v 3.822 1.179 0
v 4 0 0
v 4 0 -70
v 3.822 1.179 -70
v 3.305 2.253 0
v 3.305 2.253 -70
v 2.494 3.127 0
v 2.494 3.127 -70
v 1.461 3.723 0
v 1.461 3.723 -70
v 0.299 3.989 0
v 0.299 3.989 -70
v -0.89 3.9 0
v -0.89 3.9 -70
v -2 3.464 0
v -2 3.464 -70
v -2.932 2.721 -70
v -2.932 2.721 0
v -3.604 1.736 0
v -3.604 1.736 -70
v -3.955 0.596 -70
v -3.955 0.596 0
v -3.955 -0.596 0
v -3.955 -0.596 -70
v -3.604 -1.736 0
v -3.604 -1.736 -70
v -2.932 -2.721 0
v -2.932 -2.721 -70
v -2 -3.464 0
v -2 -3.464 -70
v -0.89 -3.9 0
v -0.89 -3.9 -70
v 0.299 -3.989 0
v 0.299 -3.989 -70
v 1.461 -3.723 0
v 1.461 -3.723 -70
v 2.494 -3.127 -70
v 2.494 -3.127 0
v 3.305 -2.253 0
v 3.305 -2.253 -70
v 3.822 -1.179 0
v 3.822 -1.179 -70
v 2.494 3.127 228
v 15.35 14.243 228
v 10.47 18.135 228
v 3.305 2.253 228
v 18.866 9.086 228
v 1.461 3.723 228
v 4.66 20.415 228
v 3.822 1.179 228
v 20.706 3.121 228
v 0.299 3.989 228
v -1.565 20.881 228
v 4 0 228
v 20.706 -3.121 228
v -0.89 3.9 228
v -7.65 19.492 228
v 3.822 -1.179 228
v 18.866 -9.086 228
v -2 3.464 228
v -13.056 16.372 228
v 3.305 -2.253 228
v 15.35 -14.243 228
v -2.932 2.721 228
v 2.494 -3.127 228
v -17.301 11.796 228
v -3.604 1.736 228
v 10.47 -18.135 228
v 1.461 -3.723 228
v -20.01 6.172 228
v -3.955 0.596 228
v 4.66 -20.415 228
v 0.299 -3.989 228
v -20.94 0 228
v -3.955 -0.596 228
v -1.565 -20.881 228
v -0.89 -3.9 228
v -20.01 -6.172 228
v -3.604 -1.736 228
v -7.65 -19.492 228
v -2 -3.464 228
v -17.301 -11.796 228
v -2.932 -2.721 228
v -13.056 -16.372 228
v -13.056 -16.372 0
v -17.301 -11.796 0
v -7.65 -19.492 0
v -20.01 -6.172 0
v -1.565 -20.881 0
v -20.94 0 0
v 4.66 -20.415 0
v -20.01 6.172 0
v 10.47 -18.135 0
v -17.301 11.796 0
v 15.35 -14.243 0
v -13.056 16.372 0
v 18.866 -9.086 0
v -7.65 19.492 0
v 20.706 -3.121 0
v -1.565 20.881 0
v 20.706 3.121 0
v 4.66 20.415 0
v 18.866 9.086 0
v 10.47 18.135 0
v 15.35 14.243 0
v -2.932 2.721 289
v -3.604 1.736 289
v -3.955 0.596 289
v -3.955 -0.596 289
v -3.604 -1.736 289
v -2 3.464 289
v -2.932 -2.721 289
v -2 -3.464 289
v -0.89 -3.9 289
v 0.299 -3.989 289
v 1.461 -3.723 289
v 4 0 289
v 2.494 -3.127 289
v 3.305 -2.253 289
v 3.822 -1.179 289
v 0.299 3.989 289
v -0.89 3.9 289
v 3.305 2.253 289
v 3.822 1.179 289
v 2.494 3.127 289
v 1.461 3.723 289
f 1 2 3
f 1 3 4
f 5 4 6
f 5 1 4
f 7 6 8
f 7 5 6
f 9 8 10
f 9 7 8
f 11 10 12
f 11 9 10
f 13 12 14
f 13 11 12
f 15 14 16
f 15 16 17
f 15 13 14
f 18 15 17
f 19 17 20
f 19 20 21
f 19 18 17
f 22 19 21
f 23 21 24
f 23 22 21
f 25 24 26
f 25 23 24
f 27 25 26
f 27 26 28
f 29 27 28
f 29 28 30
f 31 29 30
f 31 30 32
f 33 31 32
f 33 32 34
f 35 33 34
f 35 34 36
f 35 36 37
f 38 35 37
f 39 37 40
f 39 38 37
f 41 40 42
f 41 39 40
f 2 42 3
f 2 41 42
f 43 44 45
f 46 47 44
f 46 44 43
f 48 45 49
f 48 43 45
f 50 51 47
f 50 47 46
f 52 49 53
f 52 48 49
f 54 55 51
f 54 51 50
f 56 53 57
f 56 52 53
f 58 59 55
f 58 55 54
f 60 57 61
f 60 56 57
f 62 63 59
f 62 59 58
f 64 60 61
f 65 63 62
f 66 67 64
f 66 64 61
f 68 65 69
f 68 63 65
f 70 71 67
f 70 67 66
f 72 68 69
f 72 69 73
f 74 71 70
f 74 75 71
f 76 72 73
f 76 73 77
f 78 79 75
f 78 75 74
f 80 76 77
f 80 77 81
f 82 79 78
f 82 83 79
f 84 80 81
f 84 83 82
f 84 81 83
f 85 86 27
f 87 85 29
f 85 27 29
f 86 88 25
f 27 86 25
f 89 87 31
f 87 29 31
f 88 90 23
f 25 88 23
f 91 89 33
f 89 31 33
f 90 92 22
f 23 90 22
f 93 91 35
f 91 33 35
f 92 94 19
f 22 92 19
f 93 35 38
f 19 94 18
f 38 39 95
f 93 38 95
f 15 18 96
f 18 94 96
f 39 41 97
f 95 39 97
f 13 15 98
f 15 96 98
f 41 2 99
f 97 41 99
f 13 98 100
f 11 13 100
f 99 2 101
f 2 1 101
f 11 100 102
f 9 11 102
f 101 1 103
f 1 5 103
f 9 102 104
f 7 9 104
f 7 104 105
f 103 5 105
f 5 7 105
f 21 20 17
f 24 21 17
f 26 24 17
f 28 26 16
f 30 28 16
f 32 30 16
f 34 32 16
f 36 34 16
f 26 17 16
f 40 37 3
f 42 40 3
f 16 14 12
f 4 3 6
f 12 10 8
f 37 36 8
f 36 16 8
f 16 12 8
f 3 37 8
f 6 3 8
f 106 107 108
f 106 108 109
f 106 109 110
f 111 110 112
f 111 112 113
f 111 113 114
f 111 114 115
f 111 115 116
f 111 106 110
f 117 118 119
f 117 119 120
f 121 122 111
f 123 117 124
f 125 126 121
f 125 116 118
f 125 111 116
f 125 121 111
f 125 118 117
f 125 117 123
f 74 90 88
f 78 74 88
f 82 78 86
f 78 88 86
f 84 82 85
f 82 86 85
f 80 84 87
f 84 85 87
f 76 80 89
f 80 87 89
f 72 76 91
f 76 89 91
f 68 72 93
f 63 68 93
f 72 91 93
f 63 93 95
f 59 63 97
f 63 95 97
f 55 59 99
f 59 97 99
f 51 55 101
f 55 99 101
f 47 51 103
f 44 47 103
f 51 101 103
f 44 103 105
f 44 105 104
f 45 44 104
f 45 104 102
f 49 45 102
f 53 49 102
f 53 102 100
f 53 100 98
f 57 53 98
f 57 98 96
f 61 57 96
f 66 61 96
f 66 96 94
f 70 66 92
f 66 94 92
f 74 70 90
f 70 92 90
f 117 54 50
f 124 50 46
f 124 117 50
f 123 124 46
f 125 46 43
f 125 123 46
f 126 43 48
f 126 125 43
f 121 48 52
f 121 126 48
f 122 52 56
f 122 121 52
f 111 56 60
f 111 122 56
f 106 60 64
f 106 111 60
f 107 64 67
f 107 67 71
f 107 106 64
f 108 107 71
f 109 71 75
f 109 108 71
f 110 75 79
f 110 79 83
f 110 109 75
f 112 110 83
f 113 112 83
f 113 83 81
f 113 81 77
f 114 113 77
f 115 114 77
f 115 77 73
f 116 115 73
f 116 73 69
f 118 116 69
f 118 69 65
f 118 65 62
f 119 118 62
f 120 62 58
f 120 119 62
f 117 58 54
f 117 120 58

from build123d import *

# Parameters (mm, degrees)
SKETCH1_R           = 20.94
SKETCH1_R_2         = 4
SKETCH1_R_3         = 3.95
BOSS_EXTRUDE1_DEPTH = 228
SKETCH1_3_R         = 4
BOSS_EXTRUDE2_DEPTH = 70
BOSS_EXTRUDE4_START = 289
SKETCH1_5_R         = 4
SKETCH1_5_R_2       = 3.95
BOSS_EXTRUDE4_DEPTH = 61


with BuildPart() as part:
    # Sketch1 → Boss-Extrude1 (new body)
    # profile 1 of 3: a face of its own
    with BuildSketch(Plane.XY):
        with Locations(Location((0, 0, 0), (0, 0, 180))):
            Circle(SKETCH1_R)
        Circle(SKETCH1_R_2, mode=Mode.SUBTRACT)
    # profile 2 of 3: a face of its own
    with BuildSketch(Plane.XY):
        Circle(SKETCH1_R_2)
        Circle(SKETCH1_R_3, mode=Mode.SUBTRACT)
    # profile 3 of 3: a face of its own
    with BuildSketch(Plane.XY):
        Circle(SKETCH1_R_3)
    extrude(amount=BOSS_EXTRUDE1_DEPTH)

    # Sketch1<3> → Boss-Extrude2 (add)
    with BuildSketch(Plane.XY):
        Circle(SKETCH1_3_R)
    extrude(amount=-BOSS_EXTRUDE2_DEPTH)

    # Sketch1<5> → Boss-Extrude4 (add)
    # profile 1 of 2: a face of its own
    with BuildSketch(Plane.XY.offset(BOSS_EXTRUDE4_START)):
        Circle(SKETCH1_5_R)
        Circle(SKETCH1_5_R_2, mode=Mode.SUBTRACT)
    # profile 2 of 2: a face of its own
    with BuildSketch(Plane.XY.offset(BOSS_EXTRUDE4_START)):
        Circle(SKETCH1_5_R_2)
    extrude(amount=-BOSS_EXTRUDE4_DEPTH)


solid = part.part
